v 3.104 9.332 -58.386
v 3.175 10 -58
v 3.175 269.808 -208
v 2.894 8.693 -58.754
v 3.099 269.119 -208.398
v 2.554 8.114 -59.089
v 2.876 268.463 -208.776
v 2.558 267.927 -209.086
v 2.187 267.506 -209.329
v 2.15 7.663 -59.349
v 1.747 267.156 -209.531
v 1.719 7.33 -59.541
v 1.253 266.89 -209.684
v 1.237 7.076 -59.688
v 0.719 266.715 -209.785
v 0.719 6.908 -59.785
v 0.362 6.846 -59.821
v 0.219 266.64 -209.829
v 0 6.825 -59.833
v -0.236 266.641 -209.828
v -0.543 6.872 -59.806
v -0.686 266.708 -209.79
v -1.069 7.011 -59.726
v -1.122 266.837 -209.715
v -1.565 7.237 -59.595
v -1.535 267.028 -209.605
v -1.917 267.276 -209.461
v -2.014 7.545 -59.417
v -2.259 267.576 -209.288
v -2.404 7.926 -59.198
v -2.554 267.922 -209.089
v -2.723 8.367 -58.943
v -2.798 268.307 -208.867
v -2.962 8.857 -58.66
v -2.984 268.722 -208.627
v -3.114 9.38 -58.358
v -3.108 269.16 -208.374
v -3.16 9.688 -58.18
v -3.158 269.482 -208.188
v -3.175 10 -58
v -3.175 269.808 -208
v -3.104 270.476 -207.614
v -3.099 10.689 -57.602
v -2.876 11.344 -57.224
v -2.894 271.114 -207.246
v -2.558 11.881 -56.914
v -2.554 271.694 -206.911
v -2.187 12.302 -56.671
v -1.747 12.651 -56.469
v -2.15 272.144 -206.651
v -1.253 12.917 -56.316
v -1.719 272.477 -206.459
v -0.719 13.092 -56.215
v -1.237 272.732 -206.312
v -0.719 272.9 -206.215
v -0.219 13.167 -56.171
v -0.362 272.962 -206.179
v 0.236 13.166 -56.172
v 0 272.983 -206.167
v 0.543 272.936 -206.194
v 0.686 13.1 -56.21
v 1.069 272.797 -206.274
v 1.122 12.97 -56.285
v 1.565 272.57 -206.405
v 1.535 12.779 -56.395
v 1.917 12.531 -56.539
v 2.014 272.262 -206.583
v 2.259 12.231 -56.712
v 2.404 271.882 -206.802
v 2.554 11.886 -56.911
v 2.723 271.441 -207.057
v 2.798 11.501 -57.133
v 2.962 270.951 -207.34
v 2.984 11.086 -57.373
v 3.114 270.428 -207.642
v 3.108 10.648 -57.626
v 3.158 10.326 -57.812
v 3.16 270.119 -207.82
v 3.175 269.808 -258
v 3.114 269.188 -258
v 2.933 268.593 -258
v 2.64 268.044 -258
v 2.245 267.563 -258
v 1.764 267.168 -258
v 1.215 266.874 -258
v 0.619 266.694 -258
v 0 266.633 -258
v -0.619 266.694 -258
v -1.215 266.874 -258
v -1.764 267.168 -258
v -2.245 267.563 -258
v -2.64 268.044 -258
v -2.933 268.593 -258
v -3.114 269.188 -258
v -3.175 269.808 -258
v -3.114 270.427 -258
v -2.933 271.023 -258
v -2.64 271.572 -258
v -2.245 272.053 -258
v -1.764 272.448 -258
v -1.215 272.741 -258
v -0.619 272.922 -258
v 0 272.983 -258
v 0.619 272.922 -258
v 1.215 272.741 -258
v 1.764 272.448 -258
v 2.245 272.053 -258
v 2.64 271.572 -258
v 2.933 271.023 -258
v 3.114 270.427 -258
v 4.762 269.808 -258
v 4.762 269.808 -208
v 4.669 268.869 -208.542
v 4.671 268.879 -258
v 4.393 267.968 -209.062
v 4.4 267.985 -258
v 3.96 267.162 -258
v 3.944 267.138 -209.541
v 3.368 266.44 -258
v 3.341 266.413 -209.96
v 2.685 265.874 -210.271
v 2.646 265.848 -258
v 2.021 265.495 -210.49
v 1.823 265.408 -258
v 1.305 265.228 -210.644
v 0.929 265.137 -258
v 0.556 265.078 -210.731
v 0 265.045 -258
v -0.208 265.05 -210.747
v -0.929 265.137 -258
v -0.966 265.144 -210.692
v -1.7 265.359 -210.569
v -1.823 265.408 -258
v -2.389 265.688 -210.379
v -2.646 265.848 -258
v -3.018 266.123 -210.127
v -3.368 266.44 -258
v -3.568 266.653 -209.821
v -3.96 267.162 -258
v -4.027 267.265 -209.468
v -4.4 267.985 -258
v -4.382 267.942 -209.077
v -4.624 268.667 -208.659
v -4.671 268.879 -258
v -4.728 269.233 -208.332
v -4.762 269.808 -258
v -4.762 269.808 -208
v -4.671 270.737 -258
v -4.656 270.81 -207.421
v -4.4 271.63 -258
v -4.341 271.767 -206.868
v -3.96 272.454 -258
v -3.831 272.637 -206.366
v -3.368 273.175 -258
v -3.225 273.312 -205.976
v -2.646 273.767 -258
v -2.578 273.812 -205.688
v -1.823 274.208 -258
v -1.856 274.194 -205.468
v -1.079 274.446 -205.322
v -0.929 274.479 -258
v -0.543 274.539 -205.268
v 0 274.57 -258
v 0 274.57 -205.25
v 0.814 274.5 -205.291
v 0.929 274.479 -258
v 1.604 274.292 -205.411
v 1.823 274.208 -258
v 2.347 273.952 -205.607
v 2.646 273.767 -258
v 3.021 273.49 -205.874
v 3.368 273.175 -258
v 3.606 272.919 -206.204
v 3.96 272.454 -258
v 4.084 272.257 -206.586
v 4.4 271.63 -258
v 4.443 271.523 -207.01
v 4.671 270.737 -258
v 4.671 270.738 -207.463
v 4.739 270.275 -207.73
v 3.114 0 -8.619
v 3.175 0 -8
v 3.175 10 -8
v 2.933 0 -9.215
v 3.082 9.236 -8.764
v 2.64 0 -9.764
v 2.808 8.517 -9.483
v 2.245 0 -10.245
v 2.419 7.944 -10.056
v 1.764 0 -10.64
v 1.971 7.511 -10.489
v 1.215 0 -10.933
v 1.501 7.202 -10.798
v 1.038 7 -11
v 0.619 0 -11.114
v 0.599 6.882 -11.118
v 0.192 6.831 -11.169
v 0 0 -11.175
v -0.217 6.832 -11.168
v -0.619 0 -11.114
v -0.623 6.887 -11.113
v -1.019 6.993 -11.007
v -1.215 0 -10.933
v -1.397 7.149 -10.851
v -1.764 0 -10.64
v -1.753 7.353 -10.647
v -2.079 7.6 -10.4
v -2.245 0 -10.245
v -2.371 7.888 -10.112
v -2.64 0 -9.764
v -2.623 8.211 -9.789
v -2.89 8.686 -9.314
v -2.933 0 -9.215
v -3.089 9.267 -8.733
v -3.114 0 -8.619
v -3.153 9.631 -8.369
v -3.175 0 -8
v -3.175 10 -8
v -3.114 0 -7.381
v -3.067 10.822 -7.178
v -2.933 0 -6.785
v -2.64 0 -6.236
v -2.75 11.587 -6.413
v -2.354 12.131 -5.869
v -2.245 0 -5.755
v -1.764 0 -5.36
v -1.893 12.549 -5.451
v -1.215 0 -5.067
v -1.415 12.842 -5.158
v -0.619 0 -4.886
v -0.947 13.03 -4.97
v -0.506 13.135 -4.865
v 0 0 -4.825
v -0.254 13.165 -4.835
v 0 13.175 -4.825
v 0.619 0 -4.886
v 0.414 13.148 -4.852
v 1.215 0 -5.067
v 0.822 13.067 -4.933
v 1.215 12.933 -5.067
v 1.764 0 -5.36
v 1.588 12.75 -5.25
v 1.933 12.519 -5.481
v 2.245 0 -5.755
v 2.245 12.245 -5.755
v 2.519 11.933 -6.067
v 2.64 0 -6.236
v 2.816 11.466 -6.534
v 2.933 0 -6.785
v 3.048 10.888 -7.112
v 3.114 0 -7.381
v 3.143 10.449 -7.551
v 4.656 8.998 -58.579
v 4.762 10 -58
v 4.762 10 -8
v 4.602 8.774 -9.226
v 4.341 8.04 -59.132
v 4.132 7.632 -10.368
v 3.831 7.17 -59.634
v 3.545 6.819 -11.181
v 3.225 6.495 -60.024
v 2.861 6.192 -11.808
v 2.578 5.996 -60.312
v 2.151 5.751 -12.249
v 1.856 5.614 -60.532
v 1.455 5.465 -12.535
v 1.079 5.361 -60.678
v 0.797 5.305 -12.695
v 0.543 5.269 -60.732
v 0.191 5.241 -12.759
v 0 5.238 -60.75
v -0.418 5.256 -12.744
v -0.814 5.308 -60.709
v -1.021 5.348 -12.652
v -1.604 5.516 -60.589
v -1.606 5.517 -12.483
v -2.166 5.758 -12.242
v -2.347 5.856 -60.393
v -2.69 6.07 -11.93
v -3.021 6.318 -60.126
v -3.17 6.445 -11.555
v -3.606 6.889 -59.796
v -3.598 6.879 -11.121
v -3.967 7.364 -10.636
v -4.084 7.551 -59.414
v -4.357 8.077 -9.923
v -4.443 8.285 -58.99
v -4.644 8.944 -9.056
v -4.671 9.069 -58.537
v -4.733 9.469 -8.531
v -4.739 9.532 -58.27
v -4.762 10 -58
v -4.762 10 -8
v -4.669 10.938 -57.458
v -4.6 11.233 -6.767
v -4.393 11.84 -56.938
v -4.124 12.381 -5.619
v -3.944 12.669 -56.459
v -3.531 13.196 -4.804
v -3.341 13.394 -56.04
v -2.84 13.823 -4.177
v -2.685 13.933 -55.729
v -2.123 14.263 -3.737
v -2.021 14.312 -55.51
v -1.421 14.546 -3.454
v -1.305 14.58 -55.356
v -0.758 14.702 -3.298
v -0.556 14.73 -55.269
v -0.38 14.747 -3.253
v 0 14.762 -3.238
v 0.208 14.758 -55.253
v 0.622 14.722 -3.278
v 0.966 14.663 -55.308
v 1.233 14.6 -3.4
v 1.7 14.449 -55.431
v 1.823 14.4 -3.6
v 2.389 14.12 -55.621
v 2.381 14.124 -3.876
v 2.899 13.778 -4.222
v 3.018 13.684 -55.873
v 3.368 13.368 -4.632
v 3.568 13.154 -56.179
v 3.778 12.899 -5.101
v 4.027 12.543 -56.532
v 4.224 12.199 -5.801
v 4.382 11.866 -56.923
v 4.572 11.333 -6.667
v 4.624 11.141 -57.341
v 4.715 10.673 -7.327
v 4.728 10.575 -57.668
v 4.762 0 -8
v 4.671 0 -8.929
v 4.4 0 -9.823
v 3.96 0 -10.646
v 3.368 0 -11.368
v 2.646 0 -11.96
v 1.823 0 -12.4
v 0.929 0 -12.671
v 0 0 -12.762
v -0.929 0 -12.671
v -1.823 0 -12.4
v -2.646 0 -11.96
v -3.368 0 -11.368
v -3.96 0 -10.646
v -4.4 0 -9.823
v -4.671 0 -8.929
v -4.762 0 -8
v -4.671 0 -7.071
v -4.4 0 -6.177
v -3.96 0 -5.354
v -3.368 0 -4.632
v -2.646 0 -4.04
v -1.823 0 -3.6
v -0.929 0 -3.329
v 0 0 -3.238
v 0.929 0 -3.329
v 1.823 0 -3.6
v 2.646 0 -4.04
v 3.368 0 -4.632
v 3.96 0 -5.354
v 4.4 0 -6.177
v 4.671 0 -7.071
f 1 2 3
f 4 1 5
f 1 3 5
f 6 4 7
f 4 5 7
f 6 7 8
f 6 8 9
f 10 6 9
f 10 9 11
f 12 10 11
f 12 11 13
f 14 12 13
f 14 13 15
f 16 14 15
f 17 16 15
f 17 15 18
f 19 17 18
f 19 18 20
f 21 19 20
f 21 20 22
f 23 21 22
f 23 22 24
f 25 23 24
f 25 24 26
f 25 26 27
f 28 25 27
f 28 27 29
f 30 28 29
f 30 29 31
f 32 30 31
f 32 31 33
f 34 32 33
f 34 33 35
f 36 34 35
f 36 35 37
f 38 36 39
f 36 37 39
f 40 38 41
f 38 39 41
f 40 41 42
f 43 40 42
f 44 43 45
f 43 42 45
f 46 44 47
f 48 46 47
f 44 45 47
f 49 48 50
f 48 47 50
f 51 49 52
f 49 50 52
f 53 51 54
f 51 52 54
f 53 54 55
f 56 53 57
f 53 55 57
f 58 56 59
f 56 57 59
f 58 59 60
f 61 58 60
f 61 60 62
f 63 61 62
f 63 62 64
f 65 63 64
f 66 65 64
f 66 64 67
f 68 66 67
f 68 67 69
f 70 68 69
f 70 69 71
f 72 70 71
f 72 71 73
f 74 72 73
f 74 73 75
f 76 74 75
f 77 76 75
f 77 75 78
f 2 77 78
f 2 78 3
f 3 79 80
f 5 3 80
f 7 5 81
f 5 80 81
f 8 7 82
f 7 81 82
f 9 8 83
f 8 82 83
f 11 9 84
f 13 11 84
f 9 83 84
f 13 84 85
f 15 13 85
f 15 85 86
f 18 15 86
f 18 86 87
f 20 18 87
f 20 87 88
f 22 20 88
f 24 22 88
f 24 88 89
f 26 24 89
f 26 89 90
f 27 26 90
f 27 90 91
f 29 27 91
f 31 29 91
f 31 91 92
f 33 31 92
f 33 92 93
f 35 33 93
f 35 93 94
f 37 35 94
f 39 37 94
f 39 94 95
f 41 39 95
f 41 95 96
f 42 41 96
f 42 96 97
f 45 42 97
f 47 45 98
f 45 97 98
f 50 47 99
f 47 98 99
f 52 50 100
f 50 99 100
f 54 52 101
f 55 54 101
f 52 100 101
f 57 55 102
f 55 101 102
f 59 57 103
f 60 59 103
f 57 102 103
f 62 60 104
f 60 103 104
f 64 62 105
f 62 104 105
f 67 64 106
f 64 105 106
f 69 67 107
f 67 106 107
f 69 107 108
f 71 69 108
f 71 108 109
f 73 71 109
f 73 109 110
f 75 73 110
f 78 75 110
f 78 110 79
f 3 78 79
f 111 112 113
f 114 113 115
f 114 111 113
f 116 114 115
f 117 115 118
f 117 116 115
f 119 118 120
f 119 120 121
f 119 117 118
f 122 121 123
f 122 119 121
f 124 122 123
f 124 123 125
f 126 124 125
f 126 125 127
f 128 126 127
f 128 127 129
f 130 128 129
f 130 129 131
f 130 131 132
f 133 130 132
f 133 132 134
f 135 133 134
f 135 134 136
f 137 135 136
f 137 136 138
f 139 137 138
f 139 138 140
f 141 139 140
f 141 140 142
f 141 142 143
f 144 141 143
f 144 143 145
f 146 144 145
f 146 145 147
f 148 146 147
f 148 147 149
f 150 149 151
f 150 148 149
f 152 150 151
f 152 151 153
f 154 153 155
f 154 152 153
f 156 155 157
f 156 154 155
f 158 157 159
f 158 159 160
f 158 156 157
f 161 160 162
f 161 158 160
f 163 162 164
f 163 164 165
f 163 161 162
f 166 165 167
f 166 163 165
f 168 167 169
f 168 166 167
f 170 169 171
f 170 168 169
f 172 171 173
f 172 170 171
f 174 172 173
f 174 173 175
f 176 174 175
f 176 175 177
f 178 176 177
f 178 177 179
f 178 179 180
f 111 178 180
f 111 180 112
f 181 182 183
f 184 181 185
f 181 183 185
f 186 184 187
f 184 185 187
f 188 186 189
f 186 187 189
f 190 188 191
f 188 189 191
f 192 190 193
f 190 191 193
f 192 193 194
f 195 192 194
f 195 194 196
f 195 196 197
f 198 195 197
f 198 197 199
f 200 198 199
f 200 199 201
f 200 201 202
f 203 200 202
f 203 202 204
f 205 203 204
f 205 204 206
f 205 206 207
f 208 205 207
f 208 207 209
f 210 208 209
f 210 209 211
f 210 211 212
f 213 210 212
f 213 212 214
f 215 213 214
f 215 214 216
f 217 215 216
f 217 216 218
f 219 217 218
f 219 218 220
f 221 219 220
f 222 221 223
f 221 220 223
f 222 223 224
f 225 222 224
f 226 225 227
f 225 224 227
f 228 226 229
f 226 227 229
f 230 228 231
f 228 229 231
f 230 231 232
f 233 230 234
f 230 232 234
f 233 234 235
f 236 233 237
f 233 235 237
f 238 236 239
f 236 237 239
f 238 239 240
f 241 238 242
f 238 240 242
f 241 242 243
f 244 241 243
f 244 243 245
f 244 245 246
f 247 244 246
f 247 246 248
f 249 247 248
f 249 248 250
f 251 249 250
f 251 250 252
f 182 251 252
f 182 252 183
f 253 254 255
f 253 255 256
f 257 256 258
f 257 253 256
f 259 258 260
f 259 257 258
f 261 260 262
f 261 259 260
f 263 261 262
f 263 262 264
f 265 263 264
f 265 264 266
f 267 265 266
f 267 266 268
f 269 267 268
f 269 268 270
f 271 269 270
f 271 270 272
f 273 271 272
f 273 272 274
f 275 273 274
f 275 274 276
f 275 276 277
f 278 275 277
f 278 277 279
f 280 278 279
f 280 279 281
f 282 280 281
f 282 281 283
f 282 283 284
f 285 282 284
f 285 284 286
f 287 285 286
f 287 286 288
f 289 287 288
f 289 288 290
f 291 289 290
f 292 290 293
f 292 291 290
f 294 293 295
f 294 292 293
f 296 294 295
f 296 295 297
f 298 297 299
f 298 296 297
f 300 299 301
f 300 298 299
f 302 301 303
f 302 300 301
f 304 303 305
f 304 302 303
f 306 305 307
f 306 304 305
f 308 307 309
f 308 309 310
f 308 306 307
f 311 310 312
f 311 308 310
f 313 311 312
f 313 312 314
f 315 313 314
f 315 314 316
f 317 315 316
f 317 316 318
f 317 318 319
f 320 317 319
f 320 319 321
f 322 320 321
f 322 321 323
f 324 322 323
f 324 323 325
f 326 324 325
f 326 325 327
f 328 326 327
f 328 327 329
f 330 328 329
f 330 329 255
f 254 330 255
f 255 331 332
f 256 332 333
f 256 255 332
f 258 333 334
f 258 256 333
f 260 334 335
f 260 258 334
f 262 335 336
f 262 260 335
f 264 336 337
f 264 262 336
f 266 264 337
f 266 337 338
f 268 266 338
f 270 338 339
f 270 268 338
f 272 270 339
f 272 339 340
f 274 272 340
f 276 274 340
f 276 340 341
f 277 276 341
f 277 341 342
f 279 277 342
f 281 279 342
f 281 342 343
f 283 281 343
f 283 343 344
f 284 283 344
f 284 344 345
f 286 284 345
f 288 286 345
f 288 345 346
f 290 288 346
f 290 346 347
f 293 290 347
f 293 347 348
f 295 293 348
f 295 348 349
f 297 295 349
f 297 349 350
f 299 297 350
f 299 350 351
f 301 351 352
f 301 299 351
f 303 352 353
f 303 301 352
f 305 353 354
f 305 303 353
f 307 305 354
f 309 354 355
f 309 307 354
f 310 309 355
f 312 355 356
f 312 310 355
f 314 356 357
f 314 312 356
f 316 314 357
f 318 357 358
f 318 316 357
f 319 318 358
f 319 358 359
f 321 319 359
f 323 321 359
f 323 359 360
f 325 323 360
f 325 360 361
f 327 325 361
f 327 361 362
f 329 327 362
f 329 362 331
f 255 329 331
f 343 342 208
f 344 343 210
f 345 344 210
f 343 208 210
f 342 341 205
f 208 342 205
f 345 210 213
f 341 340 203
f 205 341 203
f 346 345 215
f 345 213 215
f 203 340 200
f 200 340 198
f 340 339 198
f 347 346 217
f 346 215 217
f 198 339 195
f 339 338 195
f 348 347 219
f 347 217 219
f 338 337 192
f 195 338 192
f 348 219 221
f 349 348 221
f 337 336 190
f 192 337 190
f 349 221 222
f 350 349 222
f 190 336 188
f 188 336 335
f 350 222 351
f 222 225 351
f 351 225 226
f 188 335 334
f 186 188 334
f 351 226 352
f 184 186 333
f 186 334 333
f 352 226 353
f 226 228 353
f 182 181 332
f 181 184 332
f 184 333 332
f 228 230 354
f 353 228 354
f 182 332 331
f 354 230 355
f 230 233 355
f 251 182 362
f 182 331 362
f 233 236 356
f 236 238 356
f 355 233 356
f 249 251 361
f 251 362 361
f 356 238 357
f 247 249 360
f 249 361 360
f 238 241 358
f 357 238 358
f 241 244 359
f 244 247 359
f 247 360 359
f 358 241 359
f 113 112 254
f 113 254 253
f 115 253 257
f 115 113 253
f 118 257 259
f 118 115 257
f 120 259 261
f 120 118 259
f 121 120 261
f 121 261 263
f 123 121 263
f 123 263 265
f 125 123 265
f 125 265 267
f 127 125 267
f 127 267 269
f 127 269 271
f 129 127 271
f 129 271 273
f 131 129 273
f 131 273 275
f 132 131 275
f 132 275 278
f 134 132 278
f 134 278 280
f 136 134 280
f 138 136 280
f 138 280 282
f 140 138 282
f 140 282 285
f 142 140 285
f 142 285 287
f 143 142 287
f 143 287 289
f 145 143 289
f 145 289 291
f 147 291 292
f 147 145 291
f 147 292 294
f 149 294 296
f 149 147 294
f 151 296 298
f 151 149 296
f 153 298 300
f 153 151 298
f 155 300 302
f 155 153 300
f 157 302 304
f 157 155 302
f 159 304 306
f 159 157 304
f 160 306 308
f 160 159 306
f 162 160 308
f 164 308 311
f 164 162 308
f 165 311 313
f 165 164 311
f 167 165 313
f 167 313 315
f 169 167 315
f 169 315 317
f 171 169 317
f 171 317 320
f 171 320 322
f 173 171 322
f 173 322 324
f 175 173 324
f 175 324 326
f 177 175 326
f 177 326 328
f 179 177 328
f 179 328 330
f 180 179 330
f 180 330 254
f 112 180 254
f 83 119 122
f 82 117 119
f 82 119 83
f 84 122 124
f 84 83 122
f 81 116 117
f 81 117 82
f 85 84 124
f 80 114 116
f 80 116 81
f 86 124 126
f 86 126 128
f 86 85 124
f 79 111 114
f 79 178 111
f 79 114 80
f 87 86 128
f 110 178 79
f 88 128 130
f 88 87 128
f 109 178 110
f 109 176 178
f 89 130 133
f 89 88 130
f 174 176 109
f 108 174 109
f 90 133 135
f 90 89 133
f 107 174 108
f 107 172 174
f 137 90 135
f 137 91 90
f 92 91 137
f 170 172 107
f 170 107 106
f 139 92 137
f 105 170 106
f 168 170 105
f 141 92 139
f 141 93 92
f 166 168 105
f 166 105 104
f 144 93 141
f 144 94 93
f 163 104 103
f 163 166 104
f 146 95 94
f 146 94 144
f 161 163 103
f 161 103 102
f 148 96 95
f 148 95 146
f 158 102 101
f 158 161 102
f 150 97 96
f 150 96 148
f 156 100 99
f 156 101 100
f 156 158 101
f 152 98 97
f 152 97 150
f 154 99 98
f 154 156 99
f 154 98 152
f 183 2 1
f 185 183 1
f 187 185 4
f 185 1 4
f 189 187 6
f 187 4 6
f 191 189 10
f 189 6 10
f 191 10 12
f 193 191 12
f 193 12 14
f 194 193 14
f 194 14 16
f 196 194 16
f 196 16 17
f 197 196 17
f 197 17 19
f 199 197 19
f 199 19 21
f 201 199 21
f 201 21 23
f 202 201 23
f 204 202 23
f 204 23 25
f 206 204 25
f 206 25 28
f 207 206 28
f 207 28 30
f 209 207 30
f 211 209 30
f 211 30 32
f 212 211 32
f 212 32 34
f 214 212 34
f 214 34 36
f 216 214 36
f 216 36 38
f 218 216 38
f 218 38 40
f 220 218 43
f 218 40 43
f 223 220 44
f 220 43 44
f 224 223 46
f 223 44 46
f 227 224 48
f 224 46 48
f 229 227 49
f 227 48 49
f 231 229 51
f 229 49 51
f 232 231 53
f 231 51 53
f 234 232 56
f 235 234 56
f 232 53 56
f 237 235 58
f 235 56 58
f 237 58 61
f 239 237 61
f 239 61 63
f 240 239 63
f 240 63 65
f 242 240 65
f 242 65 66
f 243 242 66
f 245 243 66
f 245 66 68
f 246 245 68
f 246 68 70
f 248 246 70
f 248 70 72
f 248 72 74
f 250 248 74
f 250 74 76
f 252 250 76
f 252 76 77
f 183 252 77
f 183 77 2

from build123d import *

# Parameters (mm, degrees)
SKETCH2_R   = 4.7625
SKETCH2_R_2 = 3.175


with BuildPart() as part:
    # Sweep2: sweep along a path in Sketch4
    with BuildLine(Plane(origin=(0, 0, 0), x_dir=(0, 0, -1), z_dir=(1, 0, 0))) as sweep2_path:
        Line((8, 0), (8, 10))
        Line((8, 10), (58, 10))
        Line((58, 10), (208, 269.807621135))
        Line((208, 269.807621135), (258, 269.807621135))
    # Sketch2 → Sweep2 (sweep)
    with BuildSketch(Plane(origin=(0, 0, 0), x_dir=(1, 0, 0), z_dir=(0, 1, 0))):
        with Locations((0, 8)):
            Circle(SKETCH2_R)
        with Locations((0, 8)):
            Circle(SKETCH2_R_2, mode=Mode.SUBTRACT)
    sweep(path=sweep2_path.line, transition=Transition.RIGHT)


solid = part.part
